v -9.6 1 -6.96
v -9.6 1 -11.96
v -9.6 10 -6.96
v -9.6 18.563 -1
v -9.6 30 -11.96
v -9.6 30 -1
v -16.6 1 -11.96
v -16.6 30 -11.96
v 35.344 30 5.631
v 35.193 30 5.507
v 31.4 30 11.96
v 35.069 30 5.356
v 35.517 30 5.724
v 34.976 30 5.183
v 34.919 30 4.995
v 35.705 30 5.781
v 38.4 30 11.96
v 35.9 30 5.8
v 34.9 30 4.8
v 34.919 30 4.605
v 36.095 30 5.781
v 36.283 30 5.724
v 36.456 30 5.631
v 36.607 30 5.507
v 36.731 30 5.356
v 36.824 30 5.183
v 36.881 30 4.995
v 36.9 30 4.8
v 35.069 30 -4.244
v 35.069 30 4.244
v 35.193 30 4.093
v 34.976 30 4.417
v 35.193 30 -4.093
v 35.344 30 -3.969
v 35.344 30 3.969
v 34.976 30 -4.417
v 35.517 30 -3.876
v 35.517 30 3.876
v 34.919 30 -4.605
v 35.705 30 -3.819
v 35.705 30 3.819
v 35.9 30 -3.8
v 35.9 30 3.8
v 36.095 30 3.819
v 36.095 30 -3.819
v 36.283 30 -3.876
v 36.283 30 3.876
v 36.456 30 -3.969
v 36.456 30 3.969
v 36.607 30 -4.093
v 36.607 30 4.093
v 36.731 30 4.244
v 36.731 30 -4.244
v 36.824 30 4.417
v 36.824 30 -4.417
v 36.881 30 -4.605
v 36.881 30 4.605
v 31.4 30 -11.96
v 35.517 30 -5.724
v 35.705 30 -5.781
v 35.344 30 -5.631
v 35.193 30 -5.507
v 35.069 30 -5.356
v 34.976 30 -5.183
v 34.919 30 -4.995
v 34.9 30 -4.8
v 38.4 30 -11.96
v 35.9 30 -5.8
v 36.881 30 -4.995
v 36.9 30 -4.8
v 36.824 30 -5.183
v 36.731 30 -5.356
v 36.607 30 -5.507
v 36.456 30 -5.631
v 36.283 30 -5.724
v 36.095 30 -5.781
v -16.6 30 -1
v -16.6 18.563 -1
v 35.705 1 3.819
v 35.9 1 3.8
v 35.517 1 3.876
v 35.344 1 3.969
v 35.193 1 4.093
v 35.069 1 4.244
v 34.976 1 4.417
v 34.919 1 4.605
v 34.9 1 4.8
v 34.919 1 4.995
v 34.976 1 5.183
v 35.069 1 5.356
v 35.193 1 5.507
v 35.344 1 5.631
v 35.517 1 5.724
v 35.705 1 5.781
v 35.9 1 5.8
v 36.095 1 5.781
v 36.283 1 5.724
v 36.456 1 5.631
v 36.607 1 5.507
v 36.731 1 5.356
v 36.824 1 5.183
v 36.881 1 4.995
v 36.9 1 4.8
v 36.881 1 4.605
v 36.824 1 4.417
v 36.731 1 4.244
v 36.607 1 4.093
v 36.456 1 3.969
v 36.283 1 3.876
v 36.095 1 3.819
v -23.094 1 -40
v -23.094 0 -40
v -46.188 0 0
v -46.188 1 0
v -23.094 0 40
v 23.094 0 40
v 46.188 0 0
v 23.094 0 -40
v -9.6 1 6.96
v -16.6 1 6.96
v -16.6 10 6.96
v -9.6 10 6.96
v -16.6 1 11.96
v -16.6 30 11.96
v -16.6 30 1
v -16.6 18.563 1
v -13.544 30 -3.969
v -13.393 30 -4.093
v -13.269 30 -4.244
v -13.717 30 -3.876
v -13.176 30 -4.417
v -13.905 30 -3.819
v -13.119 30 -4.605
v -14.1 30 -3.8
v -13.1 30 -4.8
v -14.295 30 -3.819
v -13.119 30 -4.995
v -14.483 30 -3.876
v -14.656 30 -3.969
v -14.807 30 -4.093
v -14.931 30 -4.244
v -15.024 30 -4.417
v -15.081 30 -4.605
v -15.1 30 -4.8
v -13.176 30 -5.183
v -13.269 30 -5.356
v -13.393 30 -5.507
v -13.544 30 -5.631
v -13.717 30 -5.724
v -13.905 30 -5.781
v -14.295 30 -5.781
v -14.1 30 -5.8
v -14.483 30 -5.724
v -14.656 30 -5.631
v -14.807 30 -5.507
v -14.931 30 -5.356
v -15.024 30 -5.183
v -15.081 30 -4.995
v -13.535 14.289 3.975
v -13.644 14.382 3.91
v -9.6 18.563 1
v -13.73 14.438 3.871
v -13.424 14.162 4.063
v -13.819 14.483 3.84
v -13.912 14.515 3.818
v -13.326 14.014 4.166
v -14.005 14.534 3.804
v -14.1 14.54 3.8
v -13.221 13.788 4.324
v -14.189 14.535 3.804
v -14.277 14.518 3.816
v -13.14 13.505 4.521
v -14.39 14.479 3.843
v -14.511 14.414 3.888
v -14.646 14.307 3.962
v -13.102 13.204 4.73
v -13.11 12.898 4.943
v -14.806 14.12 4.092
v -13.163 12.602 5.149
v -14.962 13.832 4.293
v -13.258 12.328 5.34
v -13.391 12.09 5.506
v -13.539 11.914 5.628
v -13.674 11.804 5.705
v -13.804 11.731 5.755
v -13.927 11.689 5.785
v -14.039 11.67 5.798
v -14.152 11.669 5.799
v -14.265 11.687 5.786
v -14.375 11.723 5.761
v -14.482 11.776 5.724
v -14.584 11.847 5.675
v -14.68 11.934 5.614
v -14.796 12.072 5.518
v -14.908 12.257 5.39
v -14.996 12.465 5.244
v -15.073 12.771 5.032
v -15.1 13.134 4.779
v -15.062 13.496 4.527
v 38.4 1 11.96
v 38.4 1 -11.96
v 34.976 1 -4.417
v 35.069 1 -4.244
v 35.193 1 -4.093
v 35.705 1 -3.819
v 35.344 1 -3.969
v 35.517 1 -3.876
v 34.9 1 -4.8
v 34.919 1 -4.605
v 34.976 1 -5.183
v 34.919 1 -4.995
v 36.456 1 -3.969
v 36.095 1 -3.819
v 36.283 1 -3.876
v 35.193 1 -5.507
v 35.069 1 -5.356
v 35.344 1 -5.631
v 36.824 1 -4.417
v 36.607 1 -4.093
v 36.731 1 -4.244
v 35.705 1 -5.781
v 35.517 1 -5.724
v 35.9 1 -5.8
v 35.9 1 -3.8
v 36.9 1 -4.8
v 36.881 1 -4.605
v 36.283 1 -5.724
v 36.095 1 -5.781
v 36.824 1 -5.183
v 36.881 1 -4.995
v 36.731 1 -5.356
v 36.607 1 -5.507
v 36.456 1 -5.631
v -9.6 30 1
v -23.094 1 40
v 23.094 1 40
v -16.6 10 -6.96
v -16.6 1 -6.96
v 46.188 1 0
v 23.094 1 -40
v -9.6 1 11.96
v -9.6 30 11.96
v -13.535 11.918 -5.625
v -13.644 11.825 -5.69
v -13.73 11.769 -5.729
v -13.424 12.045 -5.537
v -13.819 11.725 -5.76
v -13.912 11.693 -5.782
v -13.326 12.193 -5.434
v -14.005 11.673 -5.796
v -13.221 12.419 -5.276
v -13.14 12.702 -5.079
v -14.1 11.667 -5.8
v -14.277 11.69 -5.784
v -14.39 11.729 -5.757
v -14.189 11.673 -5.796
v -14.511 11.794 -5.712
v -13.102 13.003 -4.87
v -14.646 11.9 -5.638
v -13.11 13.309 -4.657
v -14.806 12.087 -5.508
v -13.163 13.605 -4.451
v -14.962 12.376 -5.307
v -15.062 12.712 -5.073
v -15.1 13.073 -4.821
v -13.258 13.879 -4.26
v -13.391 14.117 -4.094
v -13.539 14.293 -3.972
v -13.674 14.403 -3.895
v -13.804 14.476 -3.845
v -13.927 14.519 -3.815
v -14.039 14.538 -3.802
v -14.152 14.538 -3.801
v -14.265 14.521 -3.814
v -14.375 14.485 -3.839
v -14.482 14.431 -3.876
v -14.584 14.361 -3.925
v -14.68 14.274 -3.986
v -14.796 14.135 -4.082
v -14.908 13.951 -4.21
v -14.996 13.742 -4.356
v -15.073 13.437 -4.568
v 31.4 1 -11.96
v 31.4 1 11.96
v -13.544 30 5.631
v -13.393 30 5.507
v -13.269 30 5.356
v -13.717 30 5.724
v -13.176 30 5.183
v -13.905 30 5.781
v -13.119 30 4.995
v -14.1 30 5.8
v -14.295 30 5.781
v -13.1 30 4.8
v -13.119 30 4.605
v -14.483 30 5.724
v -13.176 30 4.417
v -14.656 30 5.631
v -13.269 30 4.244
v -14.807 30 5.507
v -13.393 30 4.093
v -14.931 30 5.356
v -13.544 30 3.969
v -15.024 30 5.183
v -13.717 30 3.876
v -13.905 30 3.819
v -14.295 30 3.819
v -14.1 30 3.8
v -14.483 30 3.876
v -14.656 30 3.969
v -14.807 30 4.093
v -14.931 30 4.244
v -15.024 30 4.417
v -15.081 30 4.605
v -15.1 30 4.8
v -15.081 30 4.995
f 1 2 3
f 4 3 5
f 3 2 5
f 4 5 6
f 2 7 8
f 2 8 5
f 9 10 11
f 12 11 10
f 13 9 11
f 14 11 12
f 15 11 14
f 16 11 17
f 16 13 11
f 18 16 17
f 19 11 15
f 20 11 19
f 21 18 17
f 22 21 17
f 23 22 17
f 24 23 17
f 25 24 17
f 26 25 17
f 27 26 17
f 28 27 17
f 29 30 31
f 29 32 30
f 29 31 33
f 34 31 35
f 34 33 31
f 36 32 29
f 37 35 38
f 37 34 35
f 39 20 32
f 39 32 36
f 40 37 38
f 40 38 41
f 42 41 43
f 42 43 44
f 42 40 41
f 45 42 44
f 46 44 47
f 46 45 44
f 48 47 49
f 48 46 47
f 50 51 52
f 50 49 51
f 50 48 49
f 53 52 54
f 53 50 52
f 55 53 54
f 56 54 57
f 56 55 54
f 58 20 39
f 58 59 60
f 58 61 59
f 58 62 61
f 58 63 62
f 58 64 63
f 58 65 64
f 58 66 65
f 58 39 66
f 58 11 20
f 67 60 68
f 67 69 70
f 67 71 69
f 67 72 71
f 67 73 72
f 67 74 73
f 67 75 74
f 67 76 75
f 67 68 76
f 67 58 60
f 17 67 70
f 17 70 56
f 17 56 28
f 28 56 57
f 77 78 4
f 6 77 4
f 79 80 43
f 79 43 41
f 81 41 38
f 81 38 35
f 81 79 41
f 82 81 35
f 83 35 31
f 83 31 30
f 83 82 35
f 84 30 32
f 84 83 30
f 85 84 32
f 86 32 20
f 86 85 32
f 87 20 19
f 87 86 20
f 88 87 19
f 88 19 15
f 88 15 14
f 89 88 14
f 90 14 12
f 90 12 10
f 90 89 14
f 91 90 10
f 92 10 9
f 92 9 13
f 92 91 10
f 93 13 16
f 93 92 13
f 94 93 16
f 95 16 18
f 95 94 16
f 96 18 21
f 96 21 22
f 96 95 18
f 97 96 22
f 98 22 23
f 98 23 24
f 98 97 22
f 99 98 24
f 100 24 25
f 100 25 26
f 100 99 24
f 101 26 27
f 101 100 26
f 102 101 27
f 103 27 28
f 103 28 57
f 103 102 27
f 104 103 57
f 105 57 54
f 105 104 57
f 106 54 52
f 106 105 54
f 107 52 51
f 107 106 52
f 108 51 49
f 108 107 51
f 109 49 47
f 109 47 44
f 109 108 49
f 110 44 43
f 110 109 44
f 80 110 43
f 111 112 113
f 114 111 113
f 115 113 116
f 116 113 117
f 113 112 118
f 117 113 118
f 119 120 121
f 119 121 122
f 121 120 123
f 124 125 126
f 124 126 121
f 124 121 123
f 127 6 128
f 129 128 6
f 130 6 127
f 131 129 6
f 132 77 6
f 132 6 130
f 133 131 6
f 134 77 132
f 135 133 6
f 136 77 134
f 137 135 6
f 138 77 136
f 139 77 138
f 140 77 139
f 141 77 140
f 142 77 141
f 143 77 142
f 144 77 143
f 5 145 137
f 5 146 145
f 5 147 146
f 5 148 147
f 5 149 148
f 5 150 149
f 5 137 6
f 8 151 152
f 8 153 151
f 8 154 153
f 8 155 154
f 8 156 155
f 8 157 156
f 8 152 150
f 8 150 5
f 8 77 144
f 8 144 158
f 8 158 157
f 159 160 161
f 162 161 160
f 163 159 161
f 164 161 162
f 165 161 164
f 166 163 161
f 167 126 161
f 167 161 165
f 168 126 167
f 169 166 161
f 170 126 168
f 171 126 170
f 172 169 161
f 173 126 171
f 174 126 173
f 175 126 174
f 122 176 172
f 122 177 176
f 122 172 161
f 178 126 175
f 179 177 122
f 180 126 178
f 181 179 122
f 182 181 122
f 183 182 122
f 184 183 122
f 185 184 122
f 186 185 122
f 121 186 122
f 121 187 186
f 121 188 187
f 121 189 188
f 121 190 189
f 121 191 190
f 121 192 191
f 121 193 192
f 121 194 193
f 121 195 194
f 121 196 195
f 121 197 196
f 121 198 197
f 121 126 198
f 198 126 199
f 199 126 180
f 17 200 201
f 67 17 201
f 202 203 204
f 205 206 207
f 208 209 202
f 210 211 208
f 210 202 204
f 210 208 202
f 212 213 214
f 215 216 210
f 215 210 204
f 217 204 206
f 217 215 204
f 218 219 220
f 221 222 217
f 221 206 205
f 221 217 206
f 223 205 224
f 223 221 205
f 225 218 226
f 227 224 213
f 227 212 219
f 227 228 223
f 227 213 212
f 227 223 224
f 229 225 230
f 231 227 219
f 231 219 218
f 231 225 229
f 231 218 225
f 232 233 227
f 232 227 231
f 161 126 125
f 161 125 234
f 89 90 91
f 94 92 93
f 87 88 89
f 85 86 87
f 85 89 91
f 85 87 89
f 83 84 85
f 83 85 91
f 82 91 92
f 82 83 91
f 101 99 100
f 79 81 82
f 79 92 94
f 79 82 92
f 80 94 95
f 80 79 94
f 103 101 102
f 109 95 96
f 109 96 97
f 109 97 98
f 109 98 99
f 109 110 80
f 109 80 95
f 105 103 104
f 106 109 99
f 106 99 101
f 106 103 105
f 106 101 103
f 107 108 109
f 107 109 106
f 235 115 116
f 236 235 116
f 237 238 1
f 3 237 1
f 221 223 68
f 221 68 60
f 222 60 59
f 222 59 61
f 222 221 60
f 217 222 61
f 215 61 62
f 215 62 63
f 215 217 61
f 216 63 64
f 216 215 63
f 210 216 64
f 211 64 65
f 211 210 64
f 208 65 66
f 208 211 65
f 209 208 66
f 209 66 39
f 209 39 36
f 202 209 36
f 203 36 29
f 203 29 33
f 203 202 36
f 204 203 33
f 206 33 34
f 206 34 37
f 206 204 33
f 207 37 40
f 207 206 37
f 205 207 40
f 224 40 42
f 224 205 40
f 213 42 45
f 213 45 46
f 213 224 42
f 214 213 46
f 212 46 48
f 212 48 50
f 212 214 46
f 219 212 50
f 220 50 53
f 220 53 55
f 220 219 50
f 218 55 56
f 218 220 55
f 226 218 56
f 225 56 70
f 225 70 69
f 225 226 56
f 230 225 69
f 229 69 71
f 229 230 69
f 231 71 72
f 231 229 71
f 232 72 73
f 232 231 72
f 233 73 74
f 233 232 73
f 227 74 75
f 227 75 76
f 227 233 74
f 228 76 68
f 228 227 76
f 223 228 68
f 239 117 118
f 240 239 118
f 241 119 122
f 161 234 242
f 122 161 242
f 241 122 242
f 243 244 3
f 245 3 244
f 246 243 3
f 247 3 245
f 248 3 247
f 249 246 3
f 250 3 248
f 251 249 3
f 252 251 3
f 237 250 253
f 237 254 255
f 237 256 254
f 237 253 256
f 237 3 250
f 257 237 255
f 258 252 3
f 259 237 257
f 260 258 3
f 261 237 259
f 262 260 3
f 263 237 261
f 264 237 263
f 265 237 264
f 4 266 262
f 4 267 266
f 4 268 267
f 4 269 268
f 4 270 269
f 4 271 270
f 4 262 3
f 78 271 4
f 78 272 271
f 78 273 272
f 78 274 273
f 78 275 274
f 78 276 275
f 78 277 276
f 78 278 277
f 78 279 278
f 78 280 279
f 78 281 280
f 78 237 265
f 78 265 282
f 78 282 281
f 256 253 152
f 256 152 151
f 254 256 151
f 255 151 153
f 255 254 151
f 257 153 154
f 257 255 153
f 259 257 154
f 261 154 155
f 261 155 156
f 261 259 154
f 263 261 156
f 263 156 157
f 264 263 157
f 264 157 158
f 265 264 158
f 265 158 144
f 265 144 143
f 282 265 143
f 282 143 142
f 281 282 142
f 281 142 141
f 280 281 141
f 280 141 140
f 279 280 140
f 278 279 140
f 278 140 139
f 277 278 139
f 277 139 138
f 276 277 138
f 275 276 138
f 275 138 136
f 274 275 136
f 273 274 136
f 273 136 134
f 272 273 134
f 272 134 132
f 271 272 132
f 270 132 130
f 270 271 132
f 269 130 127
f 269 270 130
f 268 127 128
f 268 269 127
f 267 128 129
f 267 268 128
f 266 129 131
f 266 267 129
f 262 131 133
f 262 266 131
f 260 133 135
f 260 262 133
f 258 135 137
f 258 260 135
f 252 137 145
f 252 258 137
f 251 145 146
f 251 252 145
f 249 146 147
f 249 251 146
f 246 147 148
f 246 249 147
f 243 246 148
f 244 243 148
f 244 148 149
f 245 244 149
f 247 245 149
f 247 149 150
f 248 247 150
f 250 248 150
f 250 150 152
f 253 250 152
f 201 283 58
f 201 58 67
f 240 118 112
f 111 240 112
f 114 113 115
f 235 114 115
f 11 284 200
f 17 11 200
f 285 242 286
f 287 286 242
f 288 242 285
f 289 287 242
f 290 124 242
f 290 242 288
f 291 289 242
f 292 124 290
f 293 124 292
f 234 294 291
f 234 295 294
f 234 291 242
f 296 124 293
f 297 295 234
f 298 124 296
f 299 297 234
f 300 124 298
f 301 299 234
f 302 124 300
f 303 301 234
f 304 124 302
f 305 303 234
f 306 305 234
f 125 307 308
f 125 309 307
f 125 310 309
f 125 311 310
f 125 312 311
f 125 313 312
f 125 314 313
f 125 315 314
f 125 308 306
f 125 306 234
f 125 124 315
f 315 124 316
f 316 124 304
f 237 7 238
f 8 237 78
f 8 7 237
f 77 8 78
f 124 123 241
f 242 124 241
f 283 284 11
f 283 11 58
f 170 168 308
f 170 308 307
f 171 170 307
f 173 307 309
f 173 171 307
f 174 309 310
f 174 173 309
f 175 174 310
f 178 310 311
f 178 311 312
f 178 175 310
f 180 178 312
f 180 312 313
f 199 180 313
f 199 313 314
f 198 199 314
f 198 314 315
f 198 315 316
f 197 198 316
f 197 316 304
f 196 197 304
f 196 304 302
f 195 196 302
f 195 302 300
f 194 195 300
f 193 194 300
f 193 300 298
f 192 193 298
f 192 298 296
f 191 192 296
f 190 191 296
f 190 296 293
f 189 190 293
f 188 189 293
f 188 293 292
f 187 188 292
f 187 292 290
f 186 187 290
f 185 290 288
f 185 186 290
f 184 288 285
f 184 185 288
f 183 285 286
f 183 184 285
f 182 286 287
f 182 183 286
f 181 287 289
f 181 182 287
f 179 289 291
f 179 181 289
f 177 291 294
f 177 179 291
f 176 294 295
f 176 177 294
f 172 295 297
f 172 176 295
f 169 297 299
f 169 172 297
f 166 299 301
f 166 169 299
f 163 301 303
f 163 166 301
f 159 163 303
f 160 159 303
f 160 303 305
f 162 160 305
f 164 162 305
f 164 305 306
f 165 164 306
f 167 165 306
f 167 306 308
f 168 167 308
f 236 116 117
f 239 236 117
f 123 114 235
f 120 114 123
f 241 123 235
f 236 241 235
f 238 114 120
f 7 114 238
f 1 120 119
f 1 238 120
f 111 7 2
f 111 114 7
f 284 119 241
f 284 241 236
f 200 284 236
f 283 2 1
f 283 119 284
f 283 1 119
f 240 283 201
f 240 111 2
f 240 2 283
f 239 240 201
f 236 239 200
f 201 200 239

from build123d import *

# Parameters (mm, degrees)
BOSS_EXTRUDE1_DEPTH = 1
SKETCH2_R           = 1
SKETCH2_W           = 7
SKETCH2_H           = 23.92041254
SKETCH2_H_2         = 5
BOSS_EXTRUDE4_DEPTH = 29
BOSS_EXTRUDE5_DEPTH = 7
SKETCH2_4_R         = 1
CUT_EXTRUDE1_DEPTH  = 29
CUT_EXTRUDE2_REACH  = 70.069
SKETCH5_W           = 7
SKETCH5_H           = 2


with BuildPart() as part:
    # Sketch1 → Boss-Extrude1 (new body)
    with BuildSketch(Plane(origin=(0, 0, 0), x_dir=(1, 0, 0), z_dir=(0, 1, 0))):
        Polygon((46.188021535, 0), (23.094010768, 40), (-23.094010768, 40), (-46.188021535, 0), (-23.094010768, -40), (23.094010768, -40), align=None)
    extrude(amount=BOSS_EXTRUDE1_DEPTH)

    # Sketch2 → Boss-Extrude4 (add)
    # profile 1 of 5: a face of its own
    with BuildSketch(Plane(origin=(0, 1, 0), x_dir=(1, 0, 0), z_dir=(0, 1, 0))):
        with Locations(Location((-14.1, -4.8, 0), (0, 0, 90))):
            Circle(SKETCH2_R)
    # profile 2 of 5: a face of its own
    with BuildSketch(Plane(origin=(0, 1, 0), x_dir=(1, 0, 0), z_dir=(0, 1, 0))):
        with Locations(Location((-14.1, 4.8, 0), (0, 0, 90))):
            Circle(SKETCH2_R)
    # profile 3 of 5: a face of its own
    with BuildSketch(Plane(origin=(0, 1, 0), x_dir=(1, 0, 0), z_dir=(0, 1, 0))):
        with Locations((34.9, 0)):
            Rectangle(SKETCH2_W, SKETCH2_H)
        with Locations(Location((35.9, -4.8, 0), (0, 0, 90))):
            Circle(SKETCH2_R, mode=Mode.SUBTRACT)
        with Locations(Location((35.9, 4.8, 0), (0, 0, 90))):
            Circle(SKETCH2_R, mode=Mode.SUBTRACT)
    # profile 4 of 5: a face of its own
    with BuildSketch(Plane(origin=(0, 1, 0), x_dir=(1, 0, 0), z_dir=(0, 1, 0))):
        with Locations((-13.1, 9.46020627)):
            Rectangle(SKETCH2_W, SKETCH2_H_2)
    # profile 5 of 5: a face of its own
    with BuildSketch(Plane(origin=(0, 1, 0), x_dir=(1, 0, 0), z_dir=(0, 1, 0))):
        with Locations((-13.1, -9.46020627)):
            Rectangle(SKETCH2_W, SKETCH2_H_2)
    extrude(amount=BOSS_EXTRUDE4_DEPTH)

    # Sketch4 → Boss-Extrude5 (add)
    with BuildSketch(Plane.ZY.offset(16.6)):
        Polygon((-6.96020627, 10), (0, 20), (6.96020627, 10), (6.96020627, 30), (-6.96020627, 30), align=None)
    extrude(amount=-BOSS_EXTRUDE5_DEPTH)

    # Sketch2<4> → Cut-Extrude1 (cut)
    with BuildSketch(Plane(origin=(0, 1, 0), x_dir=(1, 0, 0), z_dir=(0, 1, 0))):
        with Locations(Location((-14.1, -4.8, 0), (0, 0, 90))):
            Circle(SKETCH2_4_R)
        with Locations(Location((-14.1, 4.8, 0), (0, 0, 90))):
            Circle(SKETCH2_4_R)
    extrude(amount=CUT_EXTRUDE1_DEPTH, mode=Mode.SUBTRACT)

    # Sketch5 → Cut-Extrude2 (cut, up to next)
    with BuildSketch(Plane(origin=(0, 30, 0), x_dir=(1, 0, 0), z_dir=(0, 1, 0)), mode=Mode.PRIVATE) as cut_extrude2_sk1:
        with Locations((-13.1, 0)):
            Rectangle(SKETCH5_W, SKETCH5_H)
    cut_extrude2_tool1 = extrude(cut_extrude2_sk1.sketch, amount=-CUT_EXTRUDE2_REACH, mode=Mode.PRIVATE) & part.part
    add(cut_extrude2_tool1.solids().sort_by_distance((-13.1, 30, 0))[0], mode=Mode.SUBTRACT)


solid = part.part
